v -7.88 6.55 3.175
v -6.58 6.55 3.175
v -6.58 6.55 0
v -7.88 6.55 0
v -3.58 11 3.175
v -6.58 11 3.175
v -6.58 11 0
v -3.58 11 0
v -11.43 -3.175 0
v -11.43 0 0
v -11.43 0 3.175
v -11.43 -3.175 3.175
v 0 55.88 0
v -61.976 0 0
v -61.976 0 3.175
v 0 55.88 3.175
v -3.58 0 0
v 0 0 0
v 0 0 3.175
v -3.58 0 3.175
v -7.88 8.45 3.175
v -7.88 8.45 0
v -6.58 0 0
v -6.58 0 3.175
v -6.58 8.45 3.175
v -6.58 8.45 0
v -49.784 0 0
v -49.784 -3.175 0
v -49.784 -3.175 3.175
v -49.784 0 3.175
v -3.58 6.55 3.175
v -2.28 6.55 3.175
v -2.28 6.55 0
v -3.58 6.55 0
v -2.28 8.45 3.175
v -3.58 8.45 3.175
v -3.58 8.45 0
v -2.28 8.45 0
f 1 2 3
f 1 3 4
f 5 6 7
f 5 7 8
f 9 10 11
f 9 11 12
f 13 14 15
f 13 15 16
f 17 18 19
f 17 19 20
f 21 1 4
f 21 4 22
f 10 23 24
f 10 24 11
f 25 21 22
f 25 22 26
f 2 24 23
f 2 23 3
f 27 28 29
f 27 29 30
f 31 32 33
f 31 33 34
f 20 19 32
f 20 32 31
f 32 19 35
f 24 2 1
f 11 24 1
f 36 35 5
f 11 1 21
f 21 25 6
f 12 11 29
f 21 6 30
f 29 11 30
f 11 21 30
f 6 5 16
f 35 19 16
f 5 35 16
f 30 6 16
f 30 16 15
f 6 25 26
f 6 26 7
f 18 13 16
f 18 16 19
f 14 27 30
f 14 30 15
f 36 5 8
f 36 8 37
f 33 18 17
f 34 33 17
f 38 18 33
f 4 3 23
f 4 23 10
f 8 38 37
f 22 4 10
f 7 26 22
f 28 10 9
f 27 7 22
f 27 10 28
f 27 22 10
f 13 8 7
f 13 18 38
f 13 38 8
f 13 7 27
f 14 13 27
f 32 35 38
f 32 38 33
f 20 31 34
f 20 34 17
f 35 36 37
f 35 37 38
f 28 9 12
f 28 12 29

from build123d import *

# Parameters (mm, degrees)
BOSS_EXTRUDE1_DEPTH = 3.175
CUT_EXTRUDE1_DEPTH  = 84.508560046


with BuildPart() as part:
    # Sketch1 → Boss-Extrude1 (new body)
    with BuildSketch(Plane.XY):
        Polygon((-61.976, 0), (0, 55.88), (0, 0), (-11.43, 0), (-11.43, -3.175), (-49.784, -3.175), (-49.784, 0), align=None)
    extrude(amount=BOSS_EXTRUDE1_DEPTH)

    # Sketch2 → Cut-Extrude1 (cut, through all)
    with BuildSketch(Plane.XY.offset(3.175)):
        Polygon((-3.58, 11), (-3.58, 8.45), (-2.28, 8.45), (-2.28, 6.55), (-3.58, 6.55), (-3.58, 0), (-6.58, 0), (-6.58, 6.55), (-7.88, 6.55), (-7.88, 8.45), (-6.58, 8.45), (-6.58, 11), align=None)
    extrude(amount=-CUT_EXTRUDE1_DEPTH, mode=Mode.SUBTRACT)


solid = part.part
